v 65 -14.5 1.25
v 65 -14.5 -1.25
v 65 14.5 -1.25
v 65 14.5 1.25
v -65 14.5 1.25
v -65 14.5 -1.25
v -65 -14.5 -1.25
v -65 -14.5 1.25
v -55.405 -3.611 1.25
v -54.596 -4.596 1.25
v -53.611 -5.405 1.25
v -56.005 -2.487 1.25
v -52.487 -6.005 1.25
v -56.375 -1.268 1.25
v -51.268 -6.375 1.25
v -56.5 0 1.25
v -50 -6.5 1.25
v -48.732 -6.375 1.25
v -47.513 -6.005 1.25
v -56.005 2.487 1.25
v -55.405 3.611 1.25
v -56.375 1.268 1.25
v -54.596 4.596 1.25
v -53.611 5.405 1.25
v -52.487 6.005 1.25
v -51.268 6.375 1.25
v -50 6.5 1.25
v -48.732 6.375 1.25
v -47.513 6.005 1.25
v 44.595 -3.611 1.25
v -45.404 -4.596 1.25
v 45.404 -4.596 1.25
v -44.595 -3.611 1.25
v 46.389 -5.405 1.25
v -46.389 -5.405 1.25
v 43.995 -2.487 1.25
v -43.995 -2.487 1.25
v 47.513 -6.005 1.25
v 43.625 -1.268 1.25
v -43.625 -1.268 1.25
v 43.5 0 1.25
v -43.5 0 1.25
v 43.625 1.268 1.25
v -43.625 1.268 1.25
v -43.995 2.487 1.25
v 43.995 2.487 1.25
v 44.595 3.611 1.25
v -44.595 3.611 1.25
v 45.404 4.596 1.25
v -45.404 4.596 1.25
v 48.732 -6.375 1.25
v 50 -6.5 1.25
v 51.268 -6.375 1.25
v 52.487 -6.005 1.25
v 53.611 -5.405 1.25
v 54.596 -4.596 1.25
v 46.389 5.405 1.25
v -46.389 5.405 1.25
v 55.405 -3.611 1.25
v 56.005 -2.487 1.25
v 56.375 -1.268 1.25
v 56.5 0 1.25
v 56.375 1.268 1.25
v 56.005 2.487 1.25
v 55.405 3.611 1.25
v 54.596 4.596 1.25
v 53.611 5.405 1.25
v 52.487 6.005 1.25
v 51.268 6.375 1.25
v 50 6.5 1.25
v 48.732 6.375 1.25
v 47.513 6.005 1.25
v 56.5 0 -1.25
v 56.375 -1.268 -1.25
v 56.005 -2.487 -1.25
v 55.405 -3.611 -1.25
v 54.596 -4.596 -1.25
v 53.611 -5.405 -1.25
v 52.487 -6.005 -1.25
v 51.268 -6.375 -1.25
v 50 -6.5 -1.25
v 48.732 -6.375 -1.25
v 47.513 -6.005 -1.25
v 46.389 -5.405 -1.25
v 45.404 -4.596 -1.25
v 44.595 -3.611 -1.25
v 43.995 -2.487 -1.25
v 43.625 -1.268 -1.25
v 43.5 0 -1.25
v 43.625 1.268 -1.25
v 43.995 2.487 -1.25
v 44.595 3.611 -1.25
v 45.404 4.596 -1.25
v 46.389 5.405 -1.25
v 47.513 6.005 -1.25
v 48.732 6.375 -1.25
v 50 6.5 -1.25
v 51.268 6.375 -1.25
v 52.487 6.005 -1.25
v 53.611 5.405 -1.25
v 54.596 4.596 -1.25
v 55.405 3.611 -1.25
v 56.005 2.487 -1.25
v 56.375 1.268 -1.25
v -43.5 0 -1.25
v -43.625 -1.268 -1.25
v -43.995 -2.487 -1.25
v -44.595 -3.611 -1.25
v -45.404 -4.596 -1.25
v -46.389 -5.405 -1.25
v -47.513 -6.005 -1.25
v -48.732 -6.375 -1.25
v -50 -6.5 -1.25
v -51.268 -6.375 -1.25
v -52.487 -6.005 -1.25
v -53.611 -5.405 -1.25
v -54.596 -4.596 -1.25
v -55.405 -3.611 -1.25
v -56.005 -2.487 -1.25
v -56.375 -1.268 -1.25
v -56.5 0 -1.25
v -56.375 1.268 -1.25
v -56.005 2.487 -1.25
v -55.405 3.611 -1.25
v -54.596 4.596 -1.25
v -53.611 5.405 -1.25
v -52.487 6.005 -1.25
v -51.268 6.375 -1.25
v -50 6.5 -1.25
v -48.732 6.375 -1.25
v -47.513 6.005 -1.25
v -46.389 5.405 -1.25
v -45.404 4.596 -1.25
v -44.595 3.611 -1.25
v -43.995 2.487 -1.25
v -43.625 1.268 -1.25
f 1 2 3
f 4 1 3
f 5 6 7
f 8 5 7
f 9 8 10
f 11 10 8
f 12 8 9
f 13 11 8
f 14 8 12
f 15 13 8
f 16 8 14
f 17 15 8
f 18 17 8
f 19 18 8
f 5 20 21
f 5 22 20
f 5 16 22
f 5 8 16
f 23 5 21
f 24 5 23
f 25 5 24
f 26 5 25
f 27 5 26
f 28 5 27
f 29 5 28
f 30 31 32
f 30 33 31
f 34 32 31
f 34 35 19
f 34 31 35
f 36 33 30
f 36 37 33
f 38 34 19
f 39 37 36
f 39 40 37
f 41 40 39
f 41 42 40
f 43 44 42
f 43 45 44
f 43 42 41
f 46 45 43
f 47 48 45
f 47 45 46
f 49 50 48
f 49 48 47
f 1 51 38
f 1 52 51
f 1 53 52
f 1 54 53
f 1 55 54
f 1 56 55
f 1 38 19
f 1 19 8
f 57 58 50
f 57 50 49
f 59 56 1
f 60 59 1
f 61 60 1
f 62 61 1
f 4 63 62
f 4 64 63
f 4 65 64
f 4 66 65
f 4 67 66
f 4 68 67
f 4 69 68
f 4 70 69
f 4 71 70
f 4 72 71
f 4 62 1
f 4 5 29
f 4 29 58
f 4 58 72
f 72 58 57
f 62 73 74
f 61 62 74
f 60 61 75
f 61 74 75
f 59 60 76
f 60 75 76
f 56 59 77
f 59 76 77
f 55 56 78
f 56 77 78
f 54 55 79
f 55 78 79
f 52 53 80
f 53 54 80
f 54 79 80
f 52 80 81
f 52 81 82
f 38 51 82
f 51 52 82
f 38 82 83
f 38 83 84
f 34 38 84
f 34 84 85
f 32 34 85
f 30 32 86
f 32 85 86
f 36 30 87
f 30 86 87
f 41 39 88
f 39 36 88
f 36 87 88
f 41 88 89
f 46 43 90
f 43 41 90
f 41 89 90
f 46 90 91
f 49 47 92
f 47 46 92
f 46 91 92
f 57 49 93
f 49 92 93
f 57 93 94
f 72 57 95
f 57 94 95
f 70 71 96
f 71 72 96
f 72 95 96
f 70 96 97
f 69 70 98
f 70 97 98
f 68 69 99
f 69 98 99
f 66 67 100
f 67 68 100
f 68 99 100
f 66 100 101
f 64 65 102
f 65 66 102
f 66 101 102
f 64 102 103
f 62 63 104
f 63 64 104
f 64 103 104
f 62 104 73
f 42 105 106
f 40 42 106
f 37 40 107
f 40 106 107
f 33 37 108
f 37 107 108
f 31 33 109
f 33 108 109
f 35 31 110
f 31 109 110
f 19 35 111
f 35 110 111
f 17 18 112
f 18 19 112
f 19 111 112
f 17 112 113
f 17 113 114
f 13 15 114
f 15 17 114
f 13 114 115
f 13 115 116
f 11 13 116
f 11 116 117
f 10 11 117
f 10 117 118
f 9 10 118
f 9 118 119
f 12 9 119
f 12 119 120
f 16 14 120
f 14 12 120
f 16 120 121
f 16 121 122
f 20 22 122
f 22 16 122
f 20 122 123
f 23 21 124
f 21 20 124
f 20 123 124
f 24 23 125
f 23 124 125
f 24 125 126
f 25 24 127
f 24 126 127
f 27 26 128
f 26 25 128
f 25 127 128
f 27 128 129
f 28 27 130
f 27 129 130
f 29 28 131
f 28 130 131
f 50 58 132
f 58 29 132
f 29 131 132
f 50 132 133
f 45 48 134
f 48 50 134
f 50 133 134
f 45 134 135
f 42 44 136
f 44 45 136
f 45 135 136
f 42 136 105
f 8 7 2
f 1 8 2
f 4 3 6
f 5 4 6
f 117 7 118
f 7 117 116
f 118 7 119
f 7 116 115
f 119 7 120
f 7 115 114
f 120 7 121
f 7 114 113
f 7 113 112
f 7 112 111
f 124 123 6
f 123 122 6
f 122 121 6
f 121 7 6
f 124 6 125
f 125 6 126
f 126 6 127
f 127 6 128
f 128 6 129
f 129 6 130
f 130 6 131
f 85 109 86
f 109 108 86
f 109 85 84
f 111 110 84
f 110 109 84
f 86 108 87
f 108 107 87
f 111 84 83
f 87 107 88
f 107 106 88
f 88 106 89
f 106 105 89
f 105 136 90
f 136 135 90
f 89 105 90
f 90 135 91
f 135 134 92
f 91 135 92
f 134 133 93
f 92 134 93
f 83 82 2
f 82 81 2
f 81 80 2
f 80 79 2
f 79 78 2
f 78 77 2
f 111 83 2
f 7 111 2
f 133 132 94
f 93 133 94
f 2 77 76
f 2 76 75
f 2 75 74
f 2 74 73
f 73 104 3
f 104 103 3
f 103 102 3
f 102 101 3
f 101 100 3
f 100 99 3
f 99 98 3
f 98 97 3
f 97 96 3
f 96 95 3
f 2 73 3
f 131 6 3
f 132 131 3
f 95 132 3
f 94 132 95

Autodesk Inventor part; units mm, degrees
ref_plane "YZ Plane" through (0, 0, 0) normal (1, 0, 0) x (0, 1, 0)
ref_plane "XZ Plane" through (0, 0, 0) normal (0, 1, 0) x (-1, 0, 0)
ref_plane "XY Plane" through (0, 0, 0) normal (0, 0, 1) x (1, 0, 0)
sketch "草圖1" plane through (0, 0, 0) normal (0, 0, 1) x (1, 0, 0)
  line L0 (0, 0) -> (-50, 0) construction
  line L1 (0, 0) -> (0, 45.4619) construction
  line L2 (-65, -14.5) -> (65, -14.5)
  line L3 (65, -14.5) -> (65, 14.5)
  line L4 (65, 14.5) -> (-65, 14.5)
  line L5 (-65, 14.5) -> (-65, -14.5)
  line L6 (-65, -14.5) -> (65, 14.5) construction
  line L7 (65, -14.5) -> (-65, 14.5) construction
  circle A0 centre (-50, 0) radius 6.5
  circle A1 centre (50, 0) radius 6.5
  dimension "d0" = 29
  dimension "d1" = 130
  dimension "d5" = 13
  dimension "d6" = 100
extrude "擠出1" add sketch "草圖1" along normal mid plane 2.5
properties part number "0 零件" material "橡膠"
